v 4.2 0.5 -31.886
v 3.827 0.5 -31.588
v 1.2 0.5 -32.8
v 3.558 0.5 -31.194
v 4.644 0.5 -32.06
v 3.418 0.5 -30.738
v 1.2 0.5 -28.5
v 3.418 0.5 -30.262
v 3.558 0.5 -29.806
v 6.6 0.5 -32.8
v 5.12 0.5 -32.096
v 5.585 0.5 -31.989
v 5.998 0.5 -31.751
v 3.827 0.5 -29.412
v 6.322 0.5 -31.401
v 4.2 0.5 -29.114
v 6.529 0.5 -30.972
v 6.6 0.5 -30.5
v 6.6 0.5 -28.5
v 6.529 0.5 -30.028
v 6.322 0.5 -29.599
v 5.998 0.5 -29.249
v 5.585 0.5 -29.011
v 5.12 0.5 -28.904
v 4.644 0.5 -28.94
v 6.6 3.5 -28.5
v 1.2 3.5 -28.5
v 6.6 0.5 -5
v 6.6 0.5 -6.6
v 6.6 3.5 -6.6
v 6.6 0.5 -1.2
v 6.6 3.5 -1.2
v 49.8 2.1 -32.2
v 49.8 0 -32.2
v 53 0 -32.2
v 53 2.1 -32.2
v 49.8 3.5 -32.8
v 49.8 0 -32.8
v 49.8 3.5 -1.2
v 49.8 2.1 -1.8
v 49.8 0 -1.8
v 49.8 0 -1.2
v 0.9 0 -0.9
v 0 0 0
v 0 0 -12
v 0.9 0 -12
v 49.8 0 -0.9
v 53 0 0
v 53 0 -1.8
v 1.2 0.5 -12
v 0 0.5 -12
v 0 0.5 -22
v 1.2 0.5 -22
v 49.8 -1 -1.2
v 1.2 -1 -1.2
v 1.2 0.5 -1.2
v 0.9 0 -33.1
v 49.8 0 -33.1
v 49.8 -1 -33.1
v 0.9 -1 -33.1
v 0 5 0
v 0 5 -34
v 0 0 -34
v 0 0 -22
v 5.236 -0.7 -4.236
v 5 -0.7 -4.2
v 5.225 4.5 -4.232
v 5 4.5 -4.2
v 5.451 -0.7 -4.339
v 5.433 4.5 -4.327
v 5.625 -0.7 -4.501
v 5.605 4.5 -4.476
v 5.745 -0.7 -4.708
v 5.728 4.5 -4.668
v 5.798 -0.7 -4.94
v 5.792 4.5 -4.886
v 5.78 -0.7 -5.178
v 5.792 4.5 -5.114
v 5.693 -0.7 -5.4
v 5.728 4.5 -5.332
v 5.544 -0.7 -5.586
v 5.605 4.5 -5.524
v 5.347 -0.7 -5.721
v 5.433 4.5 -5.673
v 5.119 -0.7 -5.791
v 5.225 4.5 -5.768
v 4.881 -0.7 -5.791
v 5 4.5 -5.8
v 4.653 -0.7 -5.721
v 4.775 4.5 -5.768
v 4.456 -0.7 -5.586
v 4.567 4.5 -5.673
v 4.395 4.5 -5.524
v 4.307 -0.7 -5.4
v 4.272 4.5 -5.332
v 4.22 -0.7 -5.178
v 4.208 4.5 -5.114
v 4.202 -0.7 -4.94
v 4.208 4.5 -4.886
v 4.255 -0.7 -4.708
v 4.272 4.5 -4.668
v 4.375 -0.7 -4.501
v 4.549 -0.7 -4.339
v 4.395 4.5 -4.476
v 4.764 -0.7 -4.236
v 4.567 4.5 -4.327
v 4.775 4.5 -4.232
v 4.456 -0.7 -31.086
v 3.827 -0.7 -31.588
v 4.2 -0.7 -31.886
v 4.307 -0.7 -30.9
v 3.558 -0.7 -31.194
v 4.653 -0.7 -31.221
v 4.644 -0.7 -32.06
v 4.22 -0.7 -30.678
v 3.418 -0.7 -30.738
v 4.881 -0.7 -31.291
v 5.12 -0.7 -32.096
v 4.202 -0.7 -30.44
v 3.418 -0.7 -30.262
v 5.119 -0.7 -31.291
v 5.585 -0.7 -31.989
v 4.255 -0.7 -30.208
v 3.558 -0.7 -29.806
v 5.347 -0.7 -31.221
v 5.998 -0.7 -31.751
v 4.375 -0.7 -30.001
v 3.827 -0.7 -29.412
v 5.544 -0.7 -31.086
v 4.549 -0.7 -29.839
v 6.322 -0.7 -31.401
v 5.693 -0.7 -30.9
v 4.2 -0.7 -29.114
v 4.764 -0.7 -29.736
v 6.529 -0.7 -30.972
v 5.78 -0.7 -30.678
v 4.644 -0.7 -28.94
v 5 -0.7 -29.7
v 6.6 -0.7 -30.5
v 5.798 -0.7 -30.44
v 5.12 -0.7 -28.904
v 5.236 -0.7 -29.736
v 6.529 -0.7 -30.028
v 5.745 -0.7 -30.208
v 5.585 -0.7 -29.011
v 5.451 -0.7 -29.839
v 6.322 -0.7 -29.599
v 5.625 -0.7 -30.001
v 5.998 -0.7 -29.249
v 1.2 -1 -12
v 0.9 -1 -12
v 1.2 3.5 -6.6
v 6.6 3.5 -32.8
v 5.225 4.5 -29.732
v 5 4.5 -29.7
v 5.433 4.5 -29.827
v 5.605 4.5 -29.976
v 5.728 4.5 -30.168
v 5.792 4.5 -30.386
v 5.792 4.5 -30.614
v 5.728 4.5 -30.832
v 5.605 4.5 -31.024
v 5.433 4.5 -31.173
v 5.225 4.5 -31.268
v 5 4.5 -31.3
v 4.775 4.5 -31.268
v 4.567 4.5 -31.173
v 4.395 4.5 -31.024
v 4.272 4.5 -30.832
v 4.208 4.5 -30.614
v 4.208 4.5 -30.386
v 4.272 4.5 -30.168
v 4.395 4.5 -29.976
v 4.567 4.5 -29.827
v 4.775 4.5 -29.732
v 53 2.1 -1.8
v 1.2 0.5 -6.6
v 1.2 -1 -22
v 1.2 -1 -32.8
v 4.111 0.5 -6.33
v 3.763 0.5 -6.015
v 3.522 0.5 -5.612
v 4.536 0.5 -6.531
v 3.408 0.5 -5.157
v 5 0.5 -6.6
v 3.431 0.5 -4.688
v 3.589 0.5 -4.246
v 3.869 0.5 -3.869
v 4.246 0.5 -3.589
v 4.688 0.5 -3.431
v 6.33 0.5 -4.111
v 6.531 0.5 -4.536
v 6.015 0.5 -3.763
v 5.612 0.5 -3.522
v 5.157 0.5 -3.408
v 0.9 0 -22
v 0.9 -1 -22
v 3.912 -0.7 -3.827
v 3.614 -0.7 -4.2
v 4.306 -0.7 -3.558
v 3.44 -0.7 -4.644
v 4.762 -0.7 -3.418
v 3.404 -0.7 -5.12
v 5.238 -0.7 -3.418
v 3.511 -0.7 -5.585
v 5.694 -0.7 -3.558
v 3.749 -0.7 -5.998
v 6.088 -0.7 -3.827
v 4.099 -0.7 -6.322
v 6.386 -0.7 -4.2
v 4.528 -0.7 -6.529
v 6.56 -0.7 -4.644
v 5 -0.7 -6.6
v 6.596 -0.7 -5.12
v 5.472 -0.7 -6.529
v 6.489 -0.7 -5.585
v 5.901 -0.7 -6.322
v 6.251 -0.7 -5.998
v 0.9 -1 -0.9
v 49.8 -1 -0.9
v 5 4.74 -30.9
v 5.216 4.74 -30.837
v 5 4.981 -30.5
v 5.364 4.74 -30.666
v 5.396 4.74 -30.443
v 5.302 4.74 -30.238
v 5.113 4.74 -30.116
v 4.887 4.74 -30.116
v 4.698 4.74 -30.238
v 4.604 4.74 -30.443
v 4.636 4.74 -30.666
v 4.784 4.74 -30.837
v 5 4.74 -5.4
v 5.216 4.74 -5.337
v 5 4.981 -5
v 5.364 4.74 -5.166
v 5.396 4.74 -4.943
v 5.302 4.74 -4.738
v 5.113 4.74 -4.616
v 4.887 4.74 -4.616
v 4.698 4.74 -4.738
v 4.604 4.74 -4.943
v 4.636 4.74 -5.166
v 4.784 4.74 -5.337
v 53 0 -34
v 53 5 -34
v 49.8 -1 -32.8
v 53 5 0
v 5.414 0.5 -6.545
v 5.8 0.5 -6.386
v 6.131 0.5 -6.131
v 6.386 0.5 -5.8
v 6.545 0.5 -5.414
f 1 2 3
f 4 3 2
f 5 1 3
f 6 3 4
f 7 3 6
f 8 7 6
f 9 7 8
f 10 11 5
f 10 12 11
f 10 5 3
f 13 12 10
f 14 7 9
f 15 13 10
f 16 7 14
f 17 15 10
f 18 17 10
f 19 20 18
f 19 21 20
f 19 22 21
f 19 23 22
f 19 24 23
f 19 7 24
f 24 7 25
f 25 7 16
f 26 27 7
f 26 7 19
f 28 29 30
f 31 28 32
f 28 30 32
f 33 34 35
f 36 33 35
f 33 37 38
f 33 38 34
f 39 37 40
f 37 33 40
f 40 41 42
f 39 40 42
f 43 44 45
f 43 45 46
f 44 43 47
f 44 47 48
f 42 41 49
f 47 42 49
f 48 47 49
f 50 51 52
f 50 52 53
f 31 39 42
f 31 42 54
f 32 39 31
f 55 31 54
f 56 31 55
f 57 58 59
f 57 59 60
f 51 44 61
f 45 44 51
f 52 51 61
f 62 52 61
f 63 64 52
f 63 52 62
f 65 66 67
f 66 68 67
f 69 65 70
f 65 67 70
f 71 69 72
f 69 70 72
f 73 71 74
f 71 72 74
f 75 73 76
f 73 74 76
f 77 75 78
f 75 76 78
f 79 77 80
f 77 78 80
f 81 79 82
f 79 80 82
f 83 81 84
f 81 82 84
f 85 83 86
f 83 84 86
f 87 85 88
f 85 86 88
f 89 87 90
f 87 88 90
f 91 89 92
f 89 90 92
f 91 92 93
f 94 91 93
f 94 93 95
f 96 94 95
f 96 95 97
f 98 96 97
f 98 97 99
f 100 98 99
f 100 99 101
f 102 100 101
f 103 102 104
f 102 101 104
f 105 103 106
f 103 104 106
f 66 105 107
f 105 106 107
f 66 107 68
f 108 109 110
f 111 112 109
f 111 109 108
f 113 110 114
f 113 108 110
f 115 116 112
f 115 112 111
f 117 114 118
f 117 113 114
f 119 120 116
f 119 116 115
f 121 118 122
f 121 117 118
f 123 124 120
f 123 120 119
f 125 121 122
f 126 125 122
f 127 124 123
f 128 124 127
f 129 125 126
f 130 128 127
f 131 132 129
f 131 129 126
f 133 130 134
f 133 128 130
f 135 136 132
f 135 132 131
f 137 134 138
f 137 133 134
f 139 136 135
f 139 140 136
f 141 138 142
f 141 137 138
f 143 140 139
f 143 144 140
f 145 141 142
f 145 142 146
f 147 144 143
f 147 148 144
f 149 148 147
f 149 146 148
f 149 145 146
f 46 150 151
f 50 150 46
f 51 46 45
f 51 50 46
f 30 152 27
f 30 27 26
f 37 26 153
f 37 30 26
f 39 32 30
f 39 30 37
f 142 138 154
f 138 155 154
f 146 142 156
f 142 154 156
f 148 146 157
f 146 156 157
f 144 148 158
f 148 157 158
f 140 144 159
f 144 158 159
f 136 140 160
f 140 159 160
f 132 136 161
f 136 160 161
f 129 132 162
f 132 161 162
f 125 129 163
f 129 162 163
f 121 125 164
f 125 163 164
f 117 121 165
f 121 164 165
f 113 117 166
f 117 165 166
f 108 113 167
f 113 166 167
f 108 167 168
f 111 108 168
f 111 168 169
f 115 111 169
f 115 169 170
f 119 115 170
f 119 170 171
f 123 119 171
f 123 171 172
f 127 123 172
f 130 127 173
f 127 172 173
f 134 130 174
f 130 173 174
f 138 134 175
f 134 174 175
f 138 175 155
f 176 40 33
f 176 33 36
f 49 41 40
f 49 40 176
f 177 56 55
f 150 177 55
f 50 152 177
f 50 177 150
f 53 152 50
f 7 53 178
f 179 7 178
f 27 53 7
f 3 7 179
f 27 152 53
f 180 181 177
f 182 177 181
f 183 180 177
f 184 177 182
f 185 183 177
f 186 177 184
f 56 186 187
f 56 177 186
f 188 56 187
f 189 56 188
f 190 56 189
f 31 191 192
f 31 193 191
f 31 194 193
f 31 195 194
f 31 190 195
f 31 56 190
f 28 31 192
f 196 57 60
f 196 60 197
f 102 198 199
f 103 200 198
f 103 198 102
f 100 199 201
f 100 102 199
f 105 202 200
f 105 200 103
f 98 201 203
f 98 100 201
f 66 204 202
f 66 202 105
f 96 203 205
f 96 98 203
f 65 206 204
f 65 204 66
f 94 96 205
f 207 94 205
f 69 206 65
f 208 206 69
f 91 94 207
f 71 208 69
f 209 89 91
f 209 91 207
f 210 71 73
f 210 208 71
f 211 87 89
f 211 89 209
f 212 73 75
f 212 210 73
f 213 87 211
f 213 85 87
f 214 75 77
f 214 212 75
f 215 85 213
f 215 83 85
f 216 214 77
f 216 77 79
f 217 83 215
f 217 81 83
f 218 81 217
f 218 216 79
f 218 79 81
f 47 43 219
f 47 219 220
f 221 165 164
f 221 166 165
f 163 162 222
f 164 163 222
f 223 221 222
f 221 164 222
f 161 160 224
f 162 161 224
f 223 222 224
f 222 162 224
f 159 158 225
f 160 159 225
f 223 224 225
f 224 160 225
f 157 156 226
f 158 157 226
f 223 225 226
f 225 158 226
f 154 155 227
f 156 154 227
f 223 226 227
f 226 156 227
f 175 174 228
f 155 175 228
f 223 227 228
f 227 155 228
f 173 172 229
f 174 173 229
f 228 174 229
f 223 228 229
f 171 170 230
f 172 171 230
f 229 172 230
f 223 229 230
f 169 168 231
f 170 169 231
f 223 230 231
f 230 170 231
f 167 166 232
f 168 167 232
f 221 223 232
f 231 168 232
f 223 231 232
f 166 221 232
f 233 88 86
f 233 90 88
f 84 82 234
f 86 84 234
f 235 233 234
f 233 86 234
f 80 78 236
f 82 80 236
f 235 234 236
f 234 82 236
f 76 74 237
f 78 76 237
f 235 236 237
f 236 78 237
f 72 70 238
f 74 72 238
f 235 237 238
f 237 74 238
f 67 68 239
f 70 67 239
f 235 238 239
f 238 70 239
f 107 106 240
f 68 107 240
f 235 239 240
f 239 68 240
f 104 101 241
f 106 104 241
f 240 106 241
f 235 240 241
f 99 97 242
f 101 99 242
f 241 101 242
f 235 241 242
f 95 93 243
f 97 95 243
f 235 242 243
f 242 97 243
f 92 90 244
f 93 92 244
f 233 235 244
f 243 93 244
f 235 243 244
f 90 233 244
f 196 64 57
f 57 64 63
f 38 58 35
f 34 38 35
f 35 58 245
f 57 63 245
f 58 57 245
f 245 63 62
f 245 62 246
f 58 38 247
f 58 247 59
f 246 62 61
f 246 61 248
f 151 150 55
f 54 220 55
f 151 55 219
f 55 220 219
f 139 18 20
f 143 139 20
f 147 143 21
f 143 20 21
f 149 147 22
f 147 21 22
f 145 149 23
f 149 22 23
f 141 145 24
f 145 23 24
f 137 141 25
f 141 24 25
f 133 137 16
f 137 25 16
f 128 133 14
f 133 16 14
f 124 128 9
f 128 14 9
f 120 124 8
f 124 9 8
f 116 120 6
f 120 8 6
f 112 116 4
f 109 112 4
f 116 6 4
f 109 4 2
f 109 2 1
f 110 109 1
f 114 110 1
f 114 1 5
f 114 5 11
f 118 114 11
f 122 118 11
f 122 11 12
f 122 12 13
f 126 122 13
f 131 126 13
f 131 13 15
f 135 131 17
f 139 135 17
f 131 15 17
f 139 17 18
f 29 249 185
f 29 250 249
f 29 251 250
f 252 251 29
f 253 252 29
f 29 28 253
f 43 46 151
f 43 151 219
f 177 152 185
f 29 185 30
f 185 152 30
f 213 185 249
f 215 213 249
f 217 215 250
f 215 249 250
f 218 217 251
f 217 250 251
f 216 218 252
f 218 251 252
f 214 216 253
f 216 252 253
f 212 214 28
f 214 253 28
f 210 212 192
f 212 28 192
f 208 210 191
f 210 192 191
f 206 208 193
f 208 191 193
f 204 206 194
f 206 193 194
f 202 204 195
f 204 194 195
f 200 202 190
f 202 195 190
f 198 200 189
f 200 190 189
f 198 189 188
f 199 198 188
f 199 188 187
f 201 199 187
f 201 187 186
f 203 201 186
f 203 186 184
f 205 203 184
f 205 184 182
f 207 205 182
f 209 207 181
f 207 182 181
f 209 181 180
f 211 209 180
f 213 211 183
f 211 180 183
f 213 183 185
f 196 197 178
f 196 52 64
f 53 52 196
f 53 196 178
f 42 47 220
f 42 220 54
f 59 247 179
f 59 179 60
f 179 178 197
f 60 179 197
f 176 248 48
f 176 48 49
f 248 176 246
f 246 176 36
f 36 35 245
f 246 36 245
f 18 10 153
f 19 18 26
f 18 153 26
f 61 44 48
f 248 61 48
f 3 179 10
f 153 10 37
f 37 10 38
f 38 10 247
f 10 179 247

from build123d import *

# Parameters (mm, degrees)
SKETCH1_W             = 53
SKETCH1_H             = 34
BOSS_EXTRUDE1_DEPTH   = 5
SKETCH2_W             = 48.6
SKETCH2_H             = 31.6
CUT_EXTRUDE1_DEPTH    = 3.5
BOSS_EXTRUDE2_DEPTH   = 1
SKETCH4_W             = 1.2
SKETCH4_H             = 10
CUT_EXTRUDE2_DEPTH    = 0.5
SKETCH5_W             = 3.2
SKETCH5_H             = 30.4
CUT_EXTRUDE3_DEPTH    = 2.1
SKETCH6_W             = 5.4
SKETCH6_H             = 5.4
SKETCH6_H_2           = 4.3
BOSS_EXTRUDE3_DEPTH   = 3
SKETCH7_R             = 1.6
BOSS_EXTRUDE4_DEPTH   = 1.2
M2_TAPPED_HOLE1_D     = 1.6
M2_TAPPED_HOLE1_DEPTH = 5.2
M2_TAPPED_HOLE1_TIP   = 0.480688495


with BuildPart() as part:
    # Sketch1 → Boss-Extrude1 (new body)
    with BuildSketch(Plane(origin=(0, 0, 0), x_dir=(1, 0, 0), z_dir=(0, 1, 0))):
        with Locations((26.5, 17)):
            Rectangle(SKETCH1_W, SKETCH1_H)
    extrude(amount=BOSS_EXTRUDE1_DEPTH)

    # Sketch2 → Cut-Extrude1 (cut)
    with BuildSketch(Plane.XZ):
        with Locations((25.5, -17)):
            Rectangle(SKETCH2_W, SKETCH2_H)
    extrude(amount=-CUT_EXTRUDE1_DEPTH, mode=Mode.SUBTRACT)

    # Sketch3 → Boss-Extrude2 (add)
    with BuildSketch(Plane.XZ):
        Polygon((49.8, -1.2), (1.2, -1.2), (1.2, -12), (0.9, -12), (0.9, -0.9), (49.8, -0.9), align=None)
        Polygon((1.2, -22), (1.2, -32.8), (49.8, -32.8), (49.8, -33.1), (0.9, -33.1), (0.9, -22), align=None)
    extrude(amount=BOSS_EXTRUDE2_DEPTH)

    # Sketch4 → Cut-Extrude2 (cut)
    with BuildSketch(Plane.XZ):
        with Locations((0.6, -17)):
            Rectangle(SKETCH4_W, SKETCH4_H)
    extrude(amount=-CUT_EXTRUDE2_DEPTH, mode=Mode.SUBTRACT)

    # Sketch5 → Cut-Extrude3 (cut)
    with BuildSketch(Plane.XZ):
        with Locations((51.4, -17)):
            Rectangle(SKETCH5_W, SKETCH5_H)
    extrude(amount=-CUT_EXTRUDE3_DEPTH, mode=Mode.SUBTRACT)

    # Sketch6 → Boss-Extrude3 (add)
    with BuildSketch(Plane.XZ.offset(-3.5)):
        with Locations((3.9, -3.9)):
            Rectangle(SKETCH6_W, SKETCH6_H)
        with Locations((3.9, -30.65)):
            Rectangle(SKETCH6_W, SKETCH6_H_2)
    extrude(amount=BOSS_EXTRUDE3_DEPTH)

    # Sketch7 → Boss-Extrude4 (add)
    with BuildSketch(Plane.XZ.offset(-0.5)):
        with Locations(Location((5, -5, 0), (0, 0, 270))):
            Circle(SKETCH7_R)
        with Locations((5, -30.5)):
            Circle(SKETCH7_R)
    extrude(amount=BOSS_EXTRUDE4_DEPTH)

    # M2 Tapped Hole1
    with Locations(Plane(origin=(5, -0.7, -5), x_dir=(0, 0, -1), z_dir=(0, -1, 0))):
        with Locations((0, 0), (25.5, 0)):
            Hole(M2_TAPPED_HOLE1_D / 2, depth=M2_TAPPED_HOLE1_DEPTH)
            with Locations((0, 0, -(M2_TAPPED_HOLE1_DEPTH + M2_TAPPED_HOLE1_TIP / 2))):  # 118° drill point
                Cone(0, M2_TAPPED_HOLE1_D / 2, M2_TAPPED_HOLE1_TIP, mode=Mode.SUBTRACT)


solid = part.part
